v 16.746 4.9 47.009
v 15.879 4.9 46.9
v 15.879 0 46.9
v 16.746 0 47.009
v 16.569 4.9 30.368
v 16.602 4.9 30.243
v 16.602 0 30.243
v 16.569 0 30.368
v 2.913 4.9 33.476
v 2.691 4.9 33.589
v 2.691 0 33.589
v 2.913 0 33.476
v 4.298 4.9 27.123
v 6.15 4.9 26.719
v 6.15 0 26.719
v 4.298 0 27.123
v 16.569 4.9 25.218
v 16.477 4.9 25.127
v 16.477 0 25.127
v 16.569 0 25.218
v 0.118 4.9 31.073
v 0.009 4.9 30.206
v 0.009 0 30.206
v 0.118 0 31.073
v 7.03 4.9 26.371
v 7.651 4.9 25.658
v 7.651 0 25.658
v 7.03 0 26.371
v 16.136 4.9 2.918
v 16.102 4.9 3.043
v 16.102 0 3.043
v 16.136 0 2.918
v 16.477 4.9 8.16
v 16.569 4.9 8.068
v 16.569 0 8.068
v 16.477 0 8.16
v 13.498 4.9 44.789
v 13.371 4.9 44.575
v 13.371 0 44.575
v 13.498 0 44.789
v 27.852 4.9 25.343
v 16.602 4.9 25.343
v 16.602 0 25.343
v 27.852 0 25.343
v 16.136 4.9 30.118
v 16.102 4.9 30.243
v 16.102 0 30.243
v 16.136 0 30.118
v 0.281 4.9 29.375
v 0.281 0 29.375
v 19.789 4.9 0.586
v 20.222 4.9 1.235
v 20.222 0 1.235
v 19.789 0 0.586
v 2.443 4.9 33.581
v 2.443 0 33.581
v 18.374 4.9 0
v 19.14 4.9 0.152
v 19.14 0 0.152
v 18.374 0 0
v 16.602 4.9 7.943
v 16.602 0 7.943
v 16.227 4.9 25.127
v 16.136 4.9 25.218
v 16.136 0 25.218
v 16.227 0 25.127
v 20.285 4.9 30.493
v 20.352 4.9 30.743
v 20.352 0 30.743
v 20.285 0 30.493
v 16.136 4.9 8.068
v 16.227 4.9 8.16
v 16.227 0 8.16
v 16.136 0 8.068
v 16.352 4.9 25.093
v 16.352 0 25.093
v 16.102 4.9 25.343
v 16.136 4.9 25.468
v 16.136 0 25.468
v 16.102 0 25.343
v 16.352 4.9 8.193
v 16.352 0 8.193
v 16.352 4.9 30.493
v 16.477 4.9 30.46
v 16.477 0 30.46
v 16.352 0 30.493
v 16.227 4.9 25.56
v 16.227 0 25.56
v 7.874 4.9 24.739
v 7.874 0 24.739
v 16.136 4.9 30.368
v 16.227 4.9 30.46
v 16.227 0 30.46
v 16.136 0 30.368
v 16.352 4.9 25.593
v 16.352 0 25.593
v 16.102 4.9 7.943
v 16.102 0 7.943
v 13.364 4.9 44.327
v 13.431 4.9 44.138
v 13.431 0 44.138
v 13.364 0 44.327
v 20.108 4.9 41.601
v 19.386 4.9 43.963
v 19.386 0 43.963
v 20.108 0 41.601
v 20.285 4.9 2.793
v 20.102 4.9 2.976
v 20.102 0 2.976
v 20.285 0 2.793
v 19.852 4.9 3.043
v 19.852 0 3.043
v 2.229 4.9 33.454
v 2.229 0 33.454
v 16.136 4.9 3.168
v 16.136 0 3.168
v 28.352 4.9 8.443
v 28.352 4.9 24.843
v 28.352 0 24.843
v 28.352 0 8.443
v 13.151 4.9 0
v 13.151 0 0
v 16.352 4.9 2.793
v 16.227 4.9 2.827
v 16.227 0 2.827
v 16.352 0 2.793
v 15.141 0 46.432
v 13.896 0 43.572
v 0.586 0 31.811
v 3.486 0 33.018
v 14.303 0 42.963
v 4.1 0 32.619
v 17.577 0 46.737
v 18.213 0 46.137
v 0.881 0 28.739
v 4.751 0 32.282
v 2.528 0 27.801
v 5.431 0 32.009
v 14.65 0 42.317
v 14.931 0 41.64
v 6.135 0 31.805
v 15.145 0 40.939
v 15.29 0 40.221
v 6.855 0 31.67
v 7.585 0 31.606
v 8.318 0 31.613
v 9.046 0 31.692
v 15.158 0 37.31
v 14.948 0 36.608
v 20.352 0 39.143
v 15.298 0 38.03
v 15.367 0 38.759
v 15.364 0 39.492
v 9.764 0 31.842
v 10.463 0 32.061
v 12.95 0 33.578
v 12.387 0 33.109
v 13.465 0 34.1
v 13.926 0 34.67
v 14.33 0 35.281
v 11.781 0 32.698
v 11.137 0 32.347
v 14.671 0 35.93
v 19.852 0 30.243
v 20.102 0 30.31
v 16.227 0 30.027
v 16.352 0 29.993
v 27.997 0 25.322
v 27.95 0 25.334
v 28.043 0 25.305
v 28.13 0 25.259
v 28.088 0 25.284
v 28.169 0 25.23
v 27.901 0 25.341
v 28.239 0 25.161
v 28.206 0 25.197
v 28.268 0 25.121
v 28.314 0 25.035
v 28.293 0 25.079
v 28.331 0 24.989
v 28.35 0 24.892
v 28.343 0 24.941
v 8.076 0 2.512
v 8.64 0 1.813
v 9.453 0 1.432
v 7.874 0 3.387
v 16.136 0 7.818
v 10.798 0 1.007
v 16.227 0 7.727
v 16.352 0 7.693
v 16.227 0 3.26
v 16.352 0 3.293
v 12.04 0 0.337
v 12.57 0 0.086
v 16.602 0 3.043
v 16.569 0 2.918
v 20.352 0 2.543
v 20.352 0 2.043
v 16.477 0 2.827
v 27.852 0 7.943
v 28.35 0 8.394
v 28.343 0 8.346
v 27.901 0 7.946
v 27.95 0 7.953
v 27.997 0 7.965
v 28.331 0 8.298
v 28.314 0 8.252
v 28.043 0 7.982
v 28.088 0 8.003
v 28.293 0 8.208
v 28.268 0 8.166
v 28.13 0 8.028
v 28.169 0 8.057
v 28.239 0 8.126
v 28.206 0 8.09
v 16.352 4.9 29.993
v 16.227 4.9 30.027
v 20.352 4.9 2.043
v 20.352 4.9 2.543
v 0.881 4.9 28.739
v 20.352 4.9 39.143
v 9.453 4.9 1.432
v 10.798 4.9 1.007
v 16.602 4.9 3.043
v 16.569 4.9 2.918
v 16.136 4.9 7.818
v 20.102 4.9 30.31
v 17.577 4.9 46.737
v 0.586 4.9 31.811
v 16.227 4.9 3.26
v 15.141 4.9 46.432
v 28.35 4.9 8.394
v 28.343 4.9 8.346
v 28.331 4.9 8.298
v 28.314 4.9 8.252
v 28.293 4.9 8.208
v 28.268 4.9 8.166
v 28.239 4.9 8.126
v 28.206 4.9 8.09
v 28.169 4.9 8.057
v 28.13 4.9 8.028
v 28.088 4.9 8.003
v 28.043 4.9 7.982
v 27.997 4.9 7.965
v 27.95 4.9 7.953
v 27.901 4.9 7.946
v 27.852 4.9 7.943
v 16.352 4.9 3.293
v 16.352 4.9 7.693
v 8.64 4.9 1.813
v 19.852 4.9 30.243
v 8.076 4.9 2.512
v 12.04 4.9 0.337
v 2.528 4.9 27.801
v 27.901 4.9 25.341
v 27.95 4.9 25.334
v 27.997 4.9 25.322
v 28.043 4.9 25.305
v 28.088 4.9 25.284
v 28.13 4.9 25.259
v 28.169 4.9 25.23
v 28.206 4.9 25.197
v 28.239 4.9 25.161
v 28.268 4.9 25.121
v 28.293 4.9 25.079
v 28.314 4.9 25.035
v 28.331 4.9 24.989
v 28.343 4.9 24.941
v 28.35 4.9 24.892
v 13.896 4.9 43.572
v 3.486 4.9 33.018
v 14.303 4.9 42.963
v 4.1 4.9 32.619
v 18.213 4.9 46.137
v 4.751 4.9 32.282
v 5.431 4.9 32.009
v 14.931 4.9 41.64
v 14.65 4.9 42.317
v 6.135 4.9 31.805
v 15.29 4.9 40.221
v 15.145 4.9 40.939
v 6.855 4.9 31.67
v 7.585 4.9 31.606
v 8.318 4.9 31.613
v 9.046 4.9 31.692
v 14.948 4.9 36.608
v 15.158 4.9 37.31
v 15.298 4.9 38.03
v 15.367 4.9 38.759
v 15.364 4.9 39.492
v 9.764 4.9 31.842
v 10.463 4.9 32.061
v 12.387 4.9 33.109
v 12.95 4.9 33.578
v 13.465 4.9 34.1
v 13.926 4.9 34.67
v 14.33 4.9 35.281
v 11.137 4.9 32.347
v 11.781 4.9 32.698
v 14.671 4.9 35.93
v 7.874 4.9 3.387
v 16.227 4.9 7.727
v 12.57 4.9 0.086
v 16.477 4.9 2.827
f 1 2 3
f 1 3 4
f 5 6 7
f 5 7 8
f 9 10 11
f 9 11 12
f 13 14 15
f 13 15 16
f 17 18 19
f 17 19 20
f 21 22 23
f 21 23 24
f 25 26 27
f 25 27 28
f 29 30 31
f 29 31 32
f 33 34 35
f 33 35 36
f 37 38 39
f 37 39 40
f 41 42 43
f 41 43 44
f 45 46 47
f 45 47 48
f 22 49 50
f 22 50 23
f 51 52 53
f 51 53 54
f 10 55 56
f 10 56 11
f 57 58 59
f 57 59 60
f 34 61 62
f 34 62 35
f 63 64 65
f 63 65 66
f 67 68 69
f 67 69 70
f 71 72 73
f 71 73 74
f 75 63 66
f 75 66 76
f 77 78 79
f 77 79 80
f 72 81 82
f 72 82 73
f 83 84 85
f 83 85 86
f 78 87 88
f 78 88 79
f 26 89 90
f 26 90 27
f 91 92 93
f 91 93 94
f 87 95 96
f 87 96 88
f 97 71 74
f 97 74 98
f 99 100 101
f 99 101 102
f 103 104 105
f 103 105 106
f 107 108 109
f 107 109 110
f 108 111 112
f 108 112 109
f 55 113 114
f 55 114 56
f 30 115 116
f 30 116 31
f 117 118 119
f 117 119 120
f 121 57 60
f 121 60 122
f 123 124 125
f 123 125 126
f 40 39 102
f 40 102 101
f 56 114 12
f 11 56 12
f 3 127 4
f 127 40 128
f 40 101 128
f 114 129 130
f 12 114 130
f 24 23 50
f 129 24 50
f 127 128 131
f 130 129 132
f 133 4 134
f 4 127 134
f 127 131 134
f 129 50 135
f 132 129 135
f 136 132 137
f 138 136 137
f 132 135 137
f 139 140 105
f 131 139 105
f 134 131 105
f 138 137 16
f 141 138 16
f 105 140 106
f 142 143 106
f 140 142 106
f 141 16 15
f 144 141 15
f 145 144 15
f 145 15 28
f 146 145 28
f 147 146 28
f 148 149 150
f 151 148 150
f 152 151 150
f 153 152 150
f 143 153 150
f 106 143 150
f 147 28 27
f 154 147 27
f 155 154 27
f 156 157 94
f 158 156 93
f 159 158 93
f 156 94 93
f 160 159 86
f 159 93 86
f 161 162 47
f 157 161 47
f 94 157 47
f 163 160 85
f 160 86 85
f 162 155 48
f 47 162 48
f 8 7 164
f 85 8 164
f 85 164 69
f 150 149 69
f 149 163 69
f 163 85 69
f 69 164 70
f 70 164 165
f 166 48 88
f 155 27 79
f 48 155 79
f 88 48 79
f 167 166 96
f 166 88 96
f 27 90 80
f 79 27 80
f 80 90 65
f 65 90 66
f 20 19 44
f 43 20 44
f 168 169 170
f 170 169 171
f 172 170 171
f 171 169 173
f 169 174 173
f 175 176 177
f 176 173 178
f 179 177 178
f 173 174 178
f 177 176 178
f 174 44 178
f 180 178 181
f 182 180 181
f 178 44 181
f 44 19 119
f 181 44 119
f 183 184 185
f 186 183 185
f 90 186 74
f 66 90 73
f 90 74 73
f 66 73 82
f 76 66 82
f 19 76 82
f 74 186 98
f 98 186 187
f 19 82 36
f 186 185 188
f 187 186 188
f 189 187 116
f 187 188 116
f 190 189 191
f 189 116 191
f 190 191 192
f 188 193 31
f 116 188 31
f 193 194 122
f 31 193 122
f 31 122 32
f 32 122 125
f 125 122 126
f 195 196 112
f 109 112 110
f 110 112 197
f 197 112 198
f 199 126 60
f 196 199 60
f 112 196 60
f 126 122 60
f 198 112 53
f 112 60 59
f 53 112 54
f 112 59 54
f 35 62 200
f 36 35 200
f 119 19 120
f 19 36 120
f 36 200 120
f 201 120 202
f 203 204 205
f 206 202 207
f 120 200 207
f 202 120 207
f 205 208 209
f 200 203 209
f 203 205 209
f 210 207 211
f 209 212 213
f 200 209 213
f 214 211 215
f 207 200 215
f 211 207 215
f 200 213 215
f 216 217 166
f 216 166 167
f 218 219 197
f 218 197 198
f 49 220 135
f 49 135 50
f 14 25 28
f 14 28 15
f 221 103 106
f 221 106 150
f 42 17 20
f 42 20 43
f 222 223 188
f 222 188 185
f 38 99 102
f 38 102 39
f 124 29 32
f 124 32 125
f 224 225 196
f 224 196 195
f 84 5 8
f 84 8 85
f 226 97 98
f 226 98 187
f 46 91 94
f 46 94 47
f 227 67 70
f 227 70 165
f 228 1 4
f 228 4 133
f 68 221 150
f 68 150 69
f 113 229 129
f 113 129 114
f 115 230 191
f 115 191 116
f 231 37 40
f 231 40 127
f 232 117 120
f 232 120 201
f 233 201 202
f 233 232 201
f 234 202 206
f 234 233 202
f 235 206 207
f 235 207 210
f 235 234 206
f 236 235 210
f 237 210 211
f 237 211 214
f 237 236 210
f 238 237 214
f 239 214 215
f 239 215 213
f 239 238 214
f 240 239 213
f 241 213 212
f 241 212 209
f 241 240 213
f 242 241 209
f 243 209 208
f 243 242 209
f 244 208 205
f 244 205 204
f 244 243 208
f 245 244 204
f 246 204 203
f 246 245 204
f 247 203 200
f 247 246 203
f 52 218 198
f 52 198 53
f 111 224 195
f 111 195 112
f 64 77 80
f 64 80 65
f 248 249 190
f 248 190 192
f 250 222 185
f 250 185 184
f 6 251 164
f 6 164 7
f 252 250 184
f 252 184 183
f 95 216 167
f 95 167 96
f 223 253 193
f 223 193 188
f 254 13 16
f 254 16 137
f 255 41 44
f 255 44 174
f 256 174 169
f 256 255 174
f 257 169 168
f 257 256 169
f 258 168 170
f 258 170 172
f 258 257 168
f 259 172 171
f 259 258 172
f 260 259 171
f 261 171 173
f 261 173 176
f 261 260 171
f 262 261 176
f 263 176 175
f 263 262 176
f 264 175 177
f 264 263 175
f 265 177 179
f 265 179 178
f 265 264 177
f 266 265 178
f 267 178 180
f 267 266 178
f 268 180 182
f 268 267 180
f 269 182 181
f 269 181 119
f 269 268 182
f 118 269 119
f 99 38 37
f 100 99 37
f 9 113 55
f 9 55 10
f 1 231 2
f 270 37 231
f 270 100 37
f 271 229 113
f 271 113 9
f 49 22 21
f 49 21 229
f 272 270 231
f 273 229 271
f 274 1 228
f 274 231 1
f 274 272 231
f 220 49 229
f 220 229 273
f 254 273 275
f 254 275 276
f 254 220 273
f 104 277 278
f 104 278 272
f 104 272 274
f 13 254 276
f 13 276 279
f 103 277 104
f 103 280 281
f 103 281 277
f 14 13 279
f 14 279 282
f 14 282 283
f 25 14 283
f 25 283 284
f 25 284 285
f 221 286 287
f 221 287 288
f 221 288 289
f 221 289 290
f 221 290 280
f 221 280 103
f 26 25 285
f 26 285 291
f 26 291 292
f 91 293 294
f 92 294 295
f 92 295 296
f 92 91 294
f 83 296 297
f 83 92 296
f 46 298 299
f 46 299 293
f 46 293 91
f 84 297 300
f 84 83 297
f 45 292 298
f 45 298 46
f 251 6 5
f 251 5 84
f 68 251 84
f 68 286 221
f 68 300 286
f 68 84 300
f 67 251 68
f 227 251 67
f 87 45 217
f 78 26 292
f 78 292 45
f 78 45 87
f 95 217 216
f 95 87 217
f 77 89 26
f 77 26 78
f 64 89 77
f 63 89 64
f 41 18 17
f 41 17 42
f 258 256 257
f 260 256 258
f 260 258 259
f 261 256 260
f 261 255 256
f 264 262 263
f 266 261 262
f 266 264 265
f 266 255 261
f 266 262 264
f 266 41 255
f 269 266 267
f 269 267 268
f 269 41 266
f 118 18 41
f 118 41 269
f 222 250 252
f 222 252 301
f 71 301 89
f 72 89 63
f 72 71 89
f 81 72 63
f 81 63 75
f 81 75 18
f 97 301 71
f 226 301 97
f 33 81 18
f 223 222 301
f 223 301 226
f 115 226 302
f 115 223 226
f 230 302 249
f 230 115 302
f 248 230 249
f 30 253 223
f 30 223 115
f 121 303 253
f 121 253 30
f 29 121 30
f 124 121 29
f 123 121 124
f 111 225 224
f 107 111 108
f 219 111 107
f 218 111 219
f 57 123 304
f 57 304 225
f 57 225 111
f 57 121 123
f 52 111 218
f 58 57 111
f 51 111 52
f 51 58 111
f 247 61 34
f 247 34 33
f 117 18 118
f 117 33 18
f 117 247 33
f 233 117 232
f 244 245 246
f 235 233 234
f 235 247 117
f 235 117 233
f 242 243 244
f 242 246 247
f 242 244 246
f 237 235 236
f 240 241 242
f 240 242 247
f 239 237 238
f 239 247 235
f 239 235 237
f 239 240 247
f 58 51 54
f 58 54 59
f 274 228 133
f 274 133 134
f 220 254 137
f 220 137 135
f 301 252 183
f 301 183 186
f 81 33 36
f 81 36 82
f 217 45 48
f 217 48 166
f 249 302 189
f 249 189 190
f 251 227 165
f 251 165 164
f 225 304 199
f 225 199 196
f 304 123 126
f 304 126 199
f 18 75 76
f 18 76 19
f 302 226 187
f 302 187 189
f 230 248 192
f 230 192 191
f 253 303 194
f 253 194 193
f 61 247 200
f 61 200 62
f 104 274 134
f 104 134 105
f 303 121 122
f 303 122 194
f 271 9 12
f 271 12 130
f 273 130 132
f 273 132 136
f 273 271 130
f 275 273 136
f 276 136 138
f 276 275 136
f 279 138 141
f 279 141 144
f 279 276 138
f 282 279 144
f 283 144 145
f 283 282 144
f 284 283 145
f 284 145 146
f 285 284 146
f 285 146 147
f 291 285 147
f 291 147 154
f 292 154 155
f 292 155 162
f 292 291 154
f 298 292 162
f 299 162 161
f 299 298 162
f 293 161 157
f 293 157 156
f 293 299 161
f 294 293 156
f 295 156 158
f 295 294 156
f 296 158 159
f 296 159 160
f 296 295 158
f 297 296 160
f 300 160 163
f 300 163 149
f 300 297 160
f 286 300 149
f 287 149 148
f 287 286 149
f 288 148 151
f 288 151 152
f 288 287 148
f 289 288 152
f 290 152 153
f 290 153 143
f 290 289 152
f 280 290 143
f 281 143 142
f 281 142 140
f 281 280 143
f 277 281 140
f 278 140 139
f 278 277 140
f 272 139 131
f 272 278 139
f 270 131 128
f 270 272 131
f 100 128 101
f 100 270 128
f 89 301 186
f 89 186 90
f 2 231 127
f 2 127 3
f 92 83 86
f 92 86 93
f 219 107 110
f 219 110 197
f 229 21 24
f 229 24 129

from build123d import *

# Parameters (mm, degrees)
BOSS_EXTRU_1_DEPTH = 4.900038


with BuildPart() as part:
    # Esquisse1 → Boss.-Extru.1 (new body)
    with BuildSketch(Plane(origin=(0, 4.900038, 0), x_dir=(1, 0, 0), z_dir=(0, 1, 0))):
        with BuildLine():
            Line((20.352144301, -2.543463741), (20.352144301, -2.043462703))
            Line((20.352144301, -2.043462703), (20.222233634, -1.234634479))
            Line((20.222233634, -1.234634479), (19.788693601, -0.58578943))
            Line((19.788693601, -0.58578943), (19.139843552, -0.152243798))
            Line((19.139843552, -0.152243798), (18.374483494, -2.386e-06))
            Line((18.374483494, -2.386e-06), (13.150843099, -2.386e-06))
            Line((13.150843099, -2.386e-06), (12.570463055, -0.086064053))
            Line((12.570463055, -0.086064053), (12.040033015, -0.336843111))
            Line((12.040033015, -0.336843111), (10.798452921, -1.006549462))
            Line((10.798452921, -1.006549462), (9.453426819, -1.431914494))
            Line((9.453426819, -1.431914494), (8.640349758, -1.813265523))
            Line((8.640349758, -1.813265523), (8.076110715, -2.511950576))
            Line((8.076110715, -2.511950576), (7.8744797, -3.387092642))
            Line((7.8744797, -3.387092642), (7.8744797, -24.738594256))
            Line((7.8744797, -24.738594256), (7.650796683, -25.657674326))
            Line((7.650796683, -25.657674326), (7.029780636, -26.37116438))
            Line((7.029780636, -26.37116438), (6.15034157, -26.719484406))
            Line((6.15034157, -26.719484406), (4.29809943, -27.122544437))
            Line((4.29809943, -27.122544437), (2.528101296, -27.801054488))
            Line((2.528101296, -27.801054488), (0.881055671, -28.739404559))
            Line((0.881055671, -28.739404559), (0.280930026, -29.374954607))
            Line((0.280930026, -29.374954607), (0.009177495, -30.20574467))
            Line((0.009177495, -30.20574467), (0.117708214, -31.073094735))
            Line((0.117708214, -31.073094735), (0.585789149, -31.811314791))
            Line((0.585789149, -31.811314791), (2.228685273, -33.454204915))
            Line((2.228685273, -33.454204915), (2.442788289, -33.580814925))
            Line((2.442788289, -33.580814925), (2.691403308, -33.588594925))
            Line((2.691403308, -33.588594925), (2.913002325, -33.475614917))
            ThreePointArc((2.913002325, -33.475614917), (13.213872644, -33.833045583), (13.430577738, -44.137836939))
            Line((13.430577738, -44.137836939), (13.363553773, -44.3265459))
            Line((13.363553773, -44.3265459), (13.371323773, -44.575155919))
            Line((13.371323773, -44.575155919), (13.497933783, -44.789265935))
            Line((13.497933783, -44.789265935), (15.140833907, -46.432156059))
            Line((15.140833907, -46.432156059), (15.879053963, -46.900236095))
            Line((15.879053963, -46.900236095), (16.746394029, -47.008766103))
            Line((16.746394029, -47.008766103), (17.577194091, -46.737016082))
            Line((17.577194091, -46.737016082), (18.212744139, -46.136886037))
            Line((18.212744139, -46.136886037), (19.385584228, -43.963185873))
            Line((19.385584228, -43.963185873), (20.108124283, -41.601305694))
            Line((20.108124283, -41.601305694), (20.352144301, -39.143465508))
            Line((20.352144301, -39.143465508), (20.352144301, -30.743464873))
            Line((20.352144301, -30.743464873), (20.285154296, -30.493464854))
            Line((20.285154296, -30.493464854), (20.102144282, -30.31045484))
            Line((20.102144282, -30.31045484), (19.852144263, -30.243464835))
            Line((19.852144263, -30.243464835), (16.602144018, -30.243464835))
            Line((16.602144018, -30.243464835), (16.568644015, -30.368465215))
            Line((16.568644015, -30.368465215), (16.477144008, -30.459975222))
            Line((16.477144008, -30.459975222), (16.352143999, -30.493465225))
            Line((16.352143999, -30.493465225), (16.227143989, -30.459975222))
            Line((16.227143989, -30.459975222), (16.135633982, -30.368465215))
            Line((16.135633982, -30.368465215), (16.10214398, -30.243465206))
            Line((16.10214398, -30.243465206), (16.135633982, -30.118465196))
            Line((16.135633982, -30.118465196), (16.227143989, -30.026955189))
            Line((16.227143989, -30.026955189), (16.352143999, -29.993465187))
            Line((16.352143999, -29.993465187), (16.352143999, -25.593464854))
            Line((16.352143999, -25.593464854), (16.227143989, -25.559974852))
            Line((16.227143989, -25.559974852), (16.135633982, -25.468464845))
            Line((16.135633982, -25.468464845), (16.10214398, -25.343464835))
            Line((16.10214398, -25.343464835), (16.135633982, -25.218464826))
            Line((16.135633982, -25.218464826), (16.227143989, -25.126954819))
            Line((16.227143989, -25.126954819), (16.352143999, -25.093464816))
            Line((16.352143999, -25.093464816), (16.477144008, -25.126954819))
            Line((16.477144008, -25.126954819), (16.568644015, -25.218464826))
            Line((16.568644015, -25.218464826), (16.602144018, -25.343464835))
            Line((16.602144018, -25.343464835), (27.852144868, -25.343464835))
            ThreePointArc((27.852144868, -25.343464835), (28.205698285, -25.197018215), (28.352144906, -24.843464798))
            Line((28.352144906, -24.843464798), (28.352144906, -8.443464873))
            ThreePointArc((28.352144906, -8.443464873), (28.205698285, -8.089911456), (27.852144868, -7.943464835))
            Line((27.852144868, -7.943464835), (16.602144018, -7.943464835))
            Line((16.602144018, -7.943464835), (16.568644015, -8.068465529))
            Line((16.568644015, -8.068465529), (16.477144008, -8.159969536))
            Line((16.477144008, -8.159969536), (16.352143999, -8.193464539))
            Line((16.352143999, -8.193464539), (16.227143989, -8.159969536))
            Line((16.227143989, -8.159969536), (16.135633982, -8.068465529))
            Line((16.135633982, -8.068465529), (16.10214398, -7.94346352))
            Line((16.10214398, -7.94346352), (16.135633982, -7.81846451))
            Line((16.135633982, -7.81846451), (16.227143989, -7.726956504))
            Line((16.227143989, -7.726956504), (16.352143999, -7.693462501))
            Line((16.352143999, -7.693462501), (16.352143999, -3.293462168))
            Line((16.352143999, -3.293462168), (16.227143989, -3.259968166))
            Line((16.227143989, -3.259968166), (16.135633982, -3.168464159))
            Line((16.135633982, -3.168464159), (16.10214398, -3.043462149))
            Line((16.10214398, -3.043462149), (16.135633982, -2.91846314))
            Line((16.135633982, -2.91846314), (16.227143989, -2.826955133))
            Line((16.227143989, -2.826955133), (16.352143999, -2.793465131))
            Line((16.352143999, -2.793465131), (16.477144008, -2.826955133))
            Line((16.477144008, -2.826955133), (16.568644015, -2.91846314))
            Line((16.568644015, -2.91846314), (16.602144018, -3.043464835))
            Line((16.602144018, -3.043464835), (19.852144263, -3.043464835))
            Line((19.852144263, -3.043464835), (20.102144282, -2.97647983))
            Line((20.102144282, -2.97647983), (20.285154296, -2.793467816))
            Line((20.285154296, -2.793467816), (20.352144301, -2.543463741))
        make_face()
    extrude(amount=-BOSS_EXTRU_1_DEPTH)


solid = part.part
